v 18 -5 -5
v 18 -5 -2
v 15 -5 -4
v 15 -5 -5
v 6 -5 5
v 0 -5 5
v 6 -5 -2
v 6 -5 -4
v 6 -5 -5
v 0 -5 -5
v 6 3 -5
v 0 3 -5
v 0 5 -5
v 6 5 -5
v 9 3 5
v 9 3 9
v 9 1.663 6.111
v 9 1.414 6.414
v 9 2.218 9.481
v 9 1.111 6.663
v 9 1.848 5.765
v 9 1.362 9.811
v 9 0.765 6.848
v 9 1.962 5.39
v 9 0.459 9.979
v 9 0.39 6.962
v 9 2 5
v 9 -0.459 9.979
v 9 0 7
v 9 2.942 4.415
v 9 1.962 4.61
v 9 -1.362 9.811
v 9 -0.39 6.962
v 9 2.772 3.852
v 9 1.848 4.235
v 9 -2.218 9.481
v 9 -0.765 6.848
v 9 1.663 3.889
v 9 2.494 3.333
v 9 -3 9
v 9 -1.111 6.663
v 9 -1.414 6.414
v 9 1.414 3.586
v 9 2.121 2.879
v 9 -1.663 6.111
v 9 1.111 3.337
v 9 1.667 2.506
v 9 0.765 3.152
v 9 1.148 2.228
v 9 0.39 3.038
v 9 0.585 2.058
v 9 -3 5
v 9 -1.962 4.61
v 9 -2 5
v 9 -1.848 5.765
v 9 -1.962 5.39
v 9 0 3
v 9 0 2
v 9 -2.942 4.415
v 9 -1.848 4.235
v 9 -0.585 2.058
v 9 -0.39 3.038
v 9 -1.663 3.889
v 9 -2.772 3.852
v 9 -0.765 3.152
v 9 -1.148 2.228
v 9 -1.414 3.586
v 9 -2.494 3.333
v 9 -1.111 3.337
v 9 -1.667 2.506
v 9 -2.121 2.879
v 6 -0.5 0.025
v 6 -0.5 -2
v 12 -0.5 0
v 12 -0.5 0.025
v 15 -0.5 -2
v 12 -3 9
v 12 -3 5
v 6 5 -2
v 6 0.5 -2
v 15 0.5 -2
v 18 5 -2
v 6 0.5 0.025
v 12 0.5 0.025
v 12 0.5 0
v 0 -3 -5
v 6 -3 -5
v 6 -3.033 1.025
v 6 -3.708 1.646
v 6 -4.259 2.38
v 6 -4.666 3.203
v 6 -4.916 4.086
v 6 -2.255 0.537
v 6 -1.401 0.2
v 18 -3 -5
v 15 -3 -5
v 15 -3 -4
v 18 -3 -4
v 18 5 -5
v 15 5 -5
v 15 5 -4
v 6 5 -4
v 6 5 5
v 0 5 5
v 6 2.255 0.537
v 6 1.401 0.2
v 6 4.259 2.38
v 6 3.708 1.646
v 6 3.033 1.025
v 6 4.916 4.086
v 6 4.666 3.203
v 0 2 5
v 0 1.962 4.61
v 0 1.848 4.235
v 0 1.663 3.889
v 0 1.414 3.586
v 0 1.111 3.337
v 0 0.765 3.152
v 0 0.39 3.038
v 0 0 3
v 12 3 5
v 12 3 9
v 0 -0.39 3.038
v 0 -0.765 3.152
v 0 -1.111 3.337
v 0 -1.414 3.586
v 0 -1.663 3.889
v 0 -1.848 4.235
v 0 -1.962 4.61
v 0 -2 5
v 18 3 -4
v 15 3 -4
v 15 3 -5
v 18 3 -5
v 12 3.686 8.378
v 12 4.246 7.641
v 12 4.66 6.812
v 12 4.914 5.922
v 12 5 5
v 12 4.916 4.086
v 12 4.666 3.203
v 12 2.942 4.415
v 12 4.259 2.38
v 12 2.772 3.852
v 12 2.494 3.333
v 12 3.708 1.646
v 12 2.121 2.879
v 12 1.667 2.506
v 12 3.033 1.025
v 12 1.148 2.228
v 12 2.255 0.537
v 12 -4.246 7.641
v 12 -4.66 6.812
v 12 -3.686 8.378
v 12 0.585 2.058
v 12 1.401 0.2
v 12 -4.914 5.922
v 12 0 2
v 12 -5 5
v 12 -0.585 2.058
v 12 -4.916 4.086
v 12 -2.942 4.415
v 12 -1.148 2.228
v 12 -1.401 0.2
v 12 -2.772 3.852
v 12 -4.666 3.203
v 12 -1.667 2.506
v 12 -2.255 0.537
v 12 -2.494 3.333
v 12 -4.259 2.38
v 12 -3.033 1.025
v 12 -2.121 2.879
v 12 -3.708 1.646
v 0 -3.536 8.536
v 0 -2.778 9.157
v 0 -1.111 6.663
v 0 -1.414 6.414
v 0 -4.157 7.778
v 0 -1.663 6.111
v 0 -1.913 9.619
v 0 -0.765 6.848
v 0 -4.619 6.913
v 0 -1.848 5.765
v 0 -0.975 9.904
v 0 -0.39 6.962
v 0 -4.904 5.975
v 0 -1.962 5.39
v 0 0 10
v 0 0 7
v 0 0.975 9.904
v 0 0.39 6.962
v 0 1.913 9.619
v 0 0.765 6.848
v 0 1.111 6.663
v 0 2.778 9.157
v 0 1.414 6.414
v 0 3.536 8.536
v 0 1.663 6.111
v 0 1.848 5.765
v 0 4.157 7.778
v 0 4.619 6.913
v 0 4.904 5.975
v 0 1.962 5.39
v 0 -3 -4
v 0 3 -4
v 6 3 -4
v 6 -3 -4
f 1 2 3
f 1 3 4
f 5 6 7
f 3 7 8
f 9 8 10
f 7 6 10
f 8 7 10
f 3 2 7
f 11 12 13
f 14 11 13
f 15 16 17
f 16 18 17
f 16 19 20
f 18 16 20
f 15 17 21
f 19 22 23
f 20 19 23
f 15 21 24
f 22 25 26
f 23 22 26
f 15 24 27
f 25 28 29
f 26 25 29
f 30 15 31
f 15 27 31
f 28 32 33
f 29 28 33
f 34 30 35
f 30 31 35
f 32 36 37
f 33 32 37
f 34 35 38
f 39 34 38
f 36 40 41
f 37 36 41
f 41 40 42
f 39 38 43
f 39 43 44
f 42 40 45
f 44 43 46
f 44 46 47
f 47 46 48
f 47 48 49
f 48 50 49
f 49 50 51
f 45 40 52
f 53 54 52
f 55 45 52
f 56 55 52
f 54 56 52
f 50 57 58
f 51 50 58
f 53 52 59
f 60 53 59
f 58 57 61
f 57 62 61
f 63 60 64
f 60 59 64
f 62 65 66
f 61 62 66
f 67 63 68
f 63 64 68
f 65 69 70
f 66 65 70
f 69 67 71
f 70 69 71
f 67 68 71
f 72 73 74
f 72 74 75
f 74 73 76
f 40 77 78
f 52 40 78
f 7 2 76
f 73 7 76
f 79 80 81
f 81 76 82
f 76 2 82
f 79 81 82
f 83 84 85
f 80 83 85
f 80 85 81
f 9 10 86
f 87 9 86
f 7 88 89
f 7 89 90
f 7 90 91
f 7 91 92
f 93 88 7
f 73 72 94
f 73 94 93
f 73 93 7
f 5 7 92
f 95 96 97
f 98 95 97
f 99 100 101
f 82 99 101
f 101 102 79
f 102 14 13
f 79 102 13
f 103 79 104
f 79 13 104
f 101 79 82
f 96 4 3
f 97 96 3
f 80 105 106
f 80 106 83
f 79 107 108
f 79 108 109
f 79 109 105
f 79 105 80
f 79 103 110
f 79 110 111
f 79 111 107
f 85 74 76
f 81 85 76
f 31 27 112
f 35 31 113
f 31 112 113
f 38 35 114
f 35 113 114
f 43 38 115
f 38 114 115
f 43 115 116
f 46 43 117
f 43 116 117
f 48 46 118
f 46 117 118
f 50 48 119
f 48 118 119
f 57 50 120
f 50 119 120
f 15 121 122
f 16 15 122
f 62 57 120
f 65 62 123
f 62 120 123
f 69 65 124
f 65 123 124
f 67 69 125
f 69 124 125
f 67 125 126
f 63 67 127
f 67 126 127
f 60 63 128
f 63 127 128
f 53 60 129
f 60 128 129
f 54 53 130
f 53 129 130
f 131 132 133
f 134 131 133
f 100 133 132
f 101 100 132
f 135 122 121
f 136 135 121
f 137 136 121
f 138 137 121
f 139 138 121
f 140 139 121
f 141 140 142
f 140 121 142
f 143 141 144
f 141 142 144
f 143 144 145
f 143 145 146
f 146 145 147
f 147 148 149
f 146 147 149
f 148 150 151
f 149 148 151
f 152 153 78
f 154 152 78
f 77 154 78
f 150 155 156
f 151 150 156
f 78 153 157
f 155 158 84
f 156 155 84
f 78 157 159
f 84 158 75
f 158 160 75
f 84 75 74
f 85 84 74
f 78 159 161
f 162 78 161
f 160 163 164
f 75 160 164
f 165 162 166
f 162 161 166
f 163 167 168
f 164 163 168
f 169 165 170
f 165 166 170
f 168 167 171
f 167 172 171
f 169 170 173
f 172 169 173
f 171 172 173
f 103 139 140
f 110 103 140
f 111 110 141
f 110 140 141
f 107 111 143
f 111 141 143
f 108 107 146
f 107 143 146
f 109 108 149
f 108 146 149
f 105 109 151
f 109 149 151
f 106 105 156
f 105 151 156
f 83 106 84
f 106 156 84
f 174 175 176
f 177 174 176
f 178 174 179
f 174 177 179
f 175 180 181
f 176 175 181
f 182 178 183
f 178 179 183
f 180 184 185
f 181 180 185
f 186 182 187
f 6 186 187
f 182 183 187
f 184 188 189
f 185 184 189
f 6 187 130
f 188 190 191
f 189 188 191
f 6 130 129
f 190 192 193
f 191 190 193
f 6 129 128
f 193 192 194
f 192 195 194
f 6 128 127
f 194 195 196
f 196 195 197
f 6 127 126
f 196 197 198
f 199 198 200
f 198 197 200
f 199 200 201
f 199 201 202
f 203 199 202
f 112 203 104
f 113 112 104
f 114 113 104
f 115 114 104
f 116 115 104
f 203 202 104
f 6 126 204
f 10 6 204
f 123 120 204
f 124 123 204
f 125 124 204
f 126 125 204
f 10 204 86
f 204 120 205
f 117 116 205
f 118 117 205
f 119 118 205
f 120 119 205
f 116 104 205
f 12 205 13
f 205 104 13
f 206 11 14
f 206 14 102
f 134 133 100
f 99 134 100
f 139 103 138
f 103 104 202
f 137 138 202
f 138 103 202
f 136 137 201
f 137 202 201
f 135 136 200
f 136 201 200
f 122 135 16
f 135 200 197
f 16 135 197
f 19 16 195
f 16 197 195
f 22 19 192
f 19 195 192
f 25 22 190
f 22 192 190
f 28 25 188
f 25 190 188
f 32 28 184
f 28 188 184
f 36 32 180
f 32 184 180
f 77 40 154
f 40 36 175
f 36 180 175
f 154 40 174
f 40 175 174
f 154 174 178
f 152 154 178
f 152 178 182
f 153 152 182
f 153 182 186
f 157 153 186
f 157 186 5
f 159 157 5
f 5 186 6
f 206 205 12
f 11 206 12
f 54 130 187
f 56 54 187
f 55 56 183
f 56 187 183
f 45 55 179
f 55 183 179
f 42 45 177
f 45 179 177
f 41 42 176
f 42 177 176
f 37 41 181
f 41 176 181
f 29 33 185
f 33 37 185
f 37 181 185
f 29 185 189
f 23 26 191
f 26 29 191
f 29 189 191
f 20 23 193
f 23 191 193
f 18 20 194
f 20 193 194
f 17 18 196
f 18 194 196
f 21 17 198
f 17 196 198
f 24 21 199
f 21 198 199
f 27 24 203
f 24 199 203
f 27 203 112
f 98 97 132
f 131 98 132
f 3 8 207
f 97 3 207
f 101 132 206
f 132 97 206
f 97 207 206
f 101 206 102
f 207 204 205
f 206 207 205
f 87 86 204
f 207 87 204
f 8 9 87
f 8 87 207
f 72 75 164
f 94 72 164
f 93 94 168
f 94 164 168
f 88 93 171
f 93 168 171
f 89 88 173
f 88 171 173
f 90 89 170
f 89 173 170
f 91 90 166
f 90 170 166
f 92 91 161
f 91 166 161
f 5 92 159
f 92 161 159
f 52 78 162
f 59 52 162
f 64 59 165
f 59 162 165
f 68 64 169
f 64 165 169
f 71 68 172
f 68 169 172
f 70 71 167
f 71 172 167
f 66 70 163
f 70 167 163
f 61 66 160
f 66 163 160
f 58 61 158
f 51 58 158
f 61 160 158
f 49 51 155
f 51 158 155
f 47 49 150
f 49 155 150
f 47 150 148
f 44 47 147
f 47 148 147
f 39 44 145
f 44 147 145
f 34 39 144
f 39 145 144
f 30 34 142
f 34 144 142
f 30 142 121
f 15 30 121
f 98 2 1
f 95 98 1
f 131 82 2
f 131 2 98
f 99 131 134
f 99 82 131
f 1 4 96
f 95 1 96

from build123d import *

# Parameters (mm, degrees)
BOSS_EXTRUDE1_DEPTH     = 18
SKETCH2_W               = 9
SKETCH2_H               = 1
CUT_EXTRUDE1_DEPTH      = 18
SKETCH3_R               = 2
CUT_EXTRUDE2_DEPTH      = 3
CUT_EXTRUDE3_DEPTH      = 3
CUT_EXTRUDE3_DEPTH_BACK = 6


with BuildPart() as part:
    # Sketch1 → Boss-Extrude1 (new body)
    with BuildSketch(Plane(origin=(0, 0, 0), x_dir=(0, 0, -1), z_dir=(1, 0, 0))):
        with BuildLine():
            ThreePointArc((-5, 5), (-10, 0), (-5, -5))
            Line((-5, -5), (-5, -2))
            ThreePointArc((-5, -2), (-7, 0), (-5, 2))
            Line((-5, 2), (-5, 5))
        make_face()
        with BuildLine():
            Line((-5, -2), (-5, -5))
            ThreePointArc((-5, -5), (-1.464466094, -3.535533906), (0, 0))
            ThreePointArc((0, 0), (-1.464466094, 3.535533906), (-5, 5))
            Line((-5, 5), (-5, 2))
            ThreePointArc((-5, 2), (-3.585786438, 1.414213562), (-3, 0))
            ThreePointArc((-3, 0), (-3.585786438, -1.414213562), (-5, -2))
        make_face()
        with BuildLine():
            ThreePointArc((-5, 5), (-10, 0), (-5, -5))
            Line((-5, -5), (-5, -2))
            ThreePointArc((-5, -2), (-7, 0), (-5, 2))
            Line((-5, 2), (-5, 5))
        make_face()
        with BuildLine():
            Line((-5, -2), (-5, -5))
            ThreePointArc((-5, -5), (-1.464466094, -3.535533906), (0, 0))
            ThreePointArc((0, 0), (-1.464466094, 3.535533906), (-5, 5))
            Line((-5, 5), (-5, 2))
            ThreePointArc((-5, 2), (-3.585786438, 1.414213562), (-3, 0))
            ThreePointArc((-3, 0), (-3.585786438, -1.414213562), (-5, -2))
        make_face()
        with BuildLine():
            Line((-5, -5), (5, -5))
            Line((5, -5), (5, -3))
            Line((5, -3), (4, -3))
            Line((4, -3), (4, 3))
            Line((4, 3), (5, 3))
            Line((5, 3), (5, 5))
            Line((5, 5), (-5, 5))
            ThreePointArc((-5, 5), (-1.464466094, 3.535533906), (0, 0))
            ThreePointArc((0, 0), (-1.464466094, -3.535533906), (-5, -5))
        make_face()
    extrude(amount=BOSS_EXTRUDE1_DEPTH)

    # Sketch2 → Cut-Extrude1 (cut)
    with BuildSketch(Plane.XZ.offset(5)):
        Polygon((9, 10), (9, 9), (12, 9), (12, 0), (15, -2), (18, -2), (18, 10), align=None)
        with Locations((10.5, -4.5)):
            Rectangle(SKETCH2_W, SKETCH2_H)
    extrude(amount=-CUT_EXTRUDE1_DEPTH, mode=Mode.SUBTRACT)

    # Sketch3 → Cut-Extrude2 (cut)
    with BuildSketch(Plane(origin=(12, 0, 0), x_dir=(0, 0, -1), z_dir=(1, 0, 0))):
        with BuildLine():
            Line((-9, -3), (-5, -3))
            ThreePointArc((-5, -3), (-2, 0), (-5, 3))
            Line((-5, 3), (-9, 3))
            Line((-9, 3), (-9, -3))
        make_face()
        with Locations((-5, 0)):
            Circle(SKETCH3_R, mode=Mode.SUBTRACT)
    extrude(amount=-CUT_EXTRUDE2_DEPTH, mode=Mode.SUBTRACT)

    # Sketch4 → Cut-Extrude3 (cut, two sides)
    with BuildSketch(Plane(origin=(12, 0, 0), x_dir=(0, 0, -1), z_dir=(1, 0, 0))) as cut_extrude3_sk:
        with BuildLine():
            Line((-0.025062814, 0.5), (2, 0.5))
            Line((2, 0.5), (2, 5))
            Line((2, 5), (-5, 5))
            ThreePointArc((-5, 5), (-1.645898034, 3.708099244), (-0.025062814, 0.5))
        make_face()
        with BuildLine():
            Line((-5, -5), (2, -5))
            Line((2, -5), (2, -0.5))
            Line((2, -0.5), (-0.025062814, -0.5))
            ThreePointArc((-0.025062814, -0.5), (-1.645898034, -3.708099244), (-5, -5))
        make_face()
    extrude(amount=CUT_EXTRUDE3_DEPTH, mode=Mode.SUBTRACT)
    extrude(cut_extrude3_sk.sketch, amount=-CUT_EXTRUDE3_DEPTH_BACK, mode=Mode.SUBTRACT)


solid = part.part
